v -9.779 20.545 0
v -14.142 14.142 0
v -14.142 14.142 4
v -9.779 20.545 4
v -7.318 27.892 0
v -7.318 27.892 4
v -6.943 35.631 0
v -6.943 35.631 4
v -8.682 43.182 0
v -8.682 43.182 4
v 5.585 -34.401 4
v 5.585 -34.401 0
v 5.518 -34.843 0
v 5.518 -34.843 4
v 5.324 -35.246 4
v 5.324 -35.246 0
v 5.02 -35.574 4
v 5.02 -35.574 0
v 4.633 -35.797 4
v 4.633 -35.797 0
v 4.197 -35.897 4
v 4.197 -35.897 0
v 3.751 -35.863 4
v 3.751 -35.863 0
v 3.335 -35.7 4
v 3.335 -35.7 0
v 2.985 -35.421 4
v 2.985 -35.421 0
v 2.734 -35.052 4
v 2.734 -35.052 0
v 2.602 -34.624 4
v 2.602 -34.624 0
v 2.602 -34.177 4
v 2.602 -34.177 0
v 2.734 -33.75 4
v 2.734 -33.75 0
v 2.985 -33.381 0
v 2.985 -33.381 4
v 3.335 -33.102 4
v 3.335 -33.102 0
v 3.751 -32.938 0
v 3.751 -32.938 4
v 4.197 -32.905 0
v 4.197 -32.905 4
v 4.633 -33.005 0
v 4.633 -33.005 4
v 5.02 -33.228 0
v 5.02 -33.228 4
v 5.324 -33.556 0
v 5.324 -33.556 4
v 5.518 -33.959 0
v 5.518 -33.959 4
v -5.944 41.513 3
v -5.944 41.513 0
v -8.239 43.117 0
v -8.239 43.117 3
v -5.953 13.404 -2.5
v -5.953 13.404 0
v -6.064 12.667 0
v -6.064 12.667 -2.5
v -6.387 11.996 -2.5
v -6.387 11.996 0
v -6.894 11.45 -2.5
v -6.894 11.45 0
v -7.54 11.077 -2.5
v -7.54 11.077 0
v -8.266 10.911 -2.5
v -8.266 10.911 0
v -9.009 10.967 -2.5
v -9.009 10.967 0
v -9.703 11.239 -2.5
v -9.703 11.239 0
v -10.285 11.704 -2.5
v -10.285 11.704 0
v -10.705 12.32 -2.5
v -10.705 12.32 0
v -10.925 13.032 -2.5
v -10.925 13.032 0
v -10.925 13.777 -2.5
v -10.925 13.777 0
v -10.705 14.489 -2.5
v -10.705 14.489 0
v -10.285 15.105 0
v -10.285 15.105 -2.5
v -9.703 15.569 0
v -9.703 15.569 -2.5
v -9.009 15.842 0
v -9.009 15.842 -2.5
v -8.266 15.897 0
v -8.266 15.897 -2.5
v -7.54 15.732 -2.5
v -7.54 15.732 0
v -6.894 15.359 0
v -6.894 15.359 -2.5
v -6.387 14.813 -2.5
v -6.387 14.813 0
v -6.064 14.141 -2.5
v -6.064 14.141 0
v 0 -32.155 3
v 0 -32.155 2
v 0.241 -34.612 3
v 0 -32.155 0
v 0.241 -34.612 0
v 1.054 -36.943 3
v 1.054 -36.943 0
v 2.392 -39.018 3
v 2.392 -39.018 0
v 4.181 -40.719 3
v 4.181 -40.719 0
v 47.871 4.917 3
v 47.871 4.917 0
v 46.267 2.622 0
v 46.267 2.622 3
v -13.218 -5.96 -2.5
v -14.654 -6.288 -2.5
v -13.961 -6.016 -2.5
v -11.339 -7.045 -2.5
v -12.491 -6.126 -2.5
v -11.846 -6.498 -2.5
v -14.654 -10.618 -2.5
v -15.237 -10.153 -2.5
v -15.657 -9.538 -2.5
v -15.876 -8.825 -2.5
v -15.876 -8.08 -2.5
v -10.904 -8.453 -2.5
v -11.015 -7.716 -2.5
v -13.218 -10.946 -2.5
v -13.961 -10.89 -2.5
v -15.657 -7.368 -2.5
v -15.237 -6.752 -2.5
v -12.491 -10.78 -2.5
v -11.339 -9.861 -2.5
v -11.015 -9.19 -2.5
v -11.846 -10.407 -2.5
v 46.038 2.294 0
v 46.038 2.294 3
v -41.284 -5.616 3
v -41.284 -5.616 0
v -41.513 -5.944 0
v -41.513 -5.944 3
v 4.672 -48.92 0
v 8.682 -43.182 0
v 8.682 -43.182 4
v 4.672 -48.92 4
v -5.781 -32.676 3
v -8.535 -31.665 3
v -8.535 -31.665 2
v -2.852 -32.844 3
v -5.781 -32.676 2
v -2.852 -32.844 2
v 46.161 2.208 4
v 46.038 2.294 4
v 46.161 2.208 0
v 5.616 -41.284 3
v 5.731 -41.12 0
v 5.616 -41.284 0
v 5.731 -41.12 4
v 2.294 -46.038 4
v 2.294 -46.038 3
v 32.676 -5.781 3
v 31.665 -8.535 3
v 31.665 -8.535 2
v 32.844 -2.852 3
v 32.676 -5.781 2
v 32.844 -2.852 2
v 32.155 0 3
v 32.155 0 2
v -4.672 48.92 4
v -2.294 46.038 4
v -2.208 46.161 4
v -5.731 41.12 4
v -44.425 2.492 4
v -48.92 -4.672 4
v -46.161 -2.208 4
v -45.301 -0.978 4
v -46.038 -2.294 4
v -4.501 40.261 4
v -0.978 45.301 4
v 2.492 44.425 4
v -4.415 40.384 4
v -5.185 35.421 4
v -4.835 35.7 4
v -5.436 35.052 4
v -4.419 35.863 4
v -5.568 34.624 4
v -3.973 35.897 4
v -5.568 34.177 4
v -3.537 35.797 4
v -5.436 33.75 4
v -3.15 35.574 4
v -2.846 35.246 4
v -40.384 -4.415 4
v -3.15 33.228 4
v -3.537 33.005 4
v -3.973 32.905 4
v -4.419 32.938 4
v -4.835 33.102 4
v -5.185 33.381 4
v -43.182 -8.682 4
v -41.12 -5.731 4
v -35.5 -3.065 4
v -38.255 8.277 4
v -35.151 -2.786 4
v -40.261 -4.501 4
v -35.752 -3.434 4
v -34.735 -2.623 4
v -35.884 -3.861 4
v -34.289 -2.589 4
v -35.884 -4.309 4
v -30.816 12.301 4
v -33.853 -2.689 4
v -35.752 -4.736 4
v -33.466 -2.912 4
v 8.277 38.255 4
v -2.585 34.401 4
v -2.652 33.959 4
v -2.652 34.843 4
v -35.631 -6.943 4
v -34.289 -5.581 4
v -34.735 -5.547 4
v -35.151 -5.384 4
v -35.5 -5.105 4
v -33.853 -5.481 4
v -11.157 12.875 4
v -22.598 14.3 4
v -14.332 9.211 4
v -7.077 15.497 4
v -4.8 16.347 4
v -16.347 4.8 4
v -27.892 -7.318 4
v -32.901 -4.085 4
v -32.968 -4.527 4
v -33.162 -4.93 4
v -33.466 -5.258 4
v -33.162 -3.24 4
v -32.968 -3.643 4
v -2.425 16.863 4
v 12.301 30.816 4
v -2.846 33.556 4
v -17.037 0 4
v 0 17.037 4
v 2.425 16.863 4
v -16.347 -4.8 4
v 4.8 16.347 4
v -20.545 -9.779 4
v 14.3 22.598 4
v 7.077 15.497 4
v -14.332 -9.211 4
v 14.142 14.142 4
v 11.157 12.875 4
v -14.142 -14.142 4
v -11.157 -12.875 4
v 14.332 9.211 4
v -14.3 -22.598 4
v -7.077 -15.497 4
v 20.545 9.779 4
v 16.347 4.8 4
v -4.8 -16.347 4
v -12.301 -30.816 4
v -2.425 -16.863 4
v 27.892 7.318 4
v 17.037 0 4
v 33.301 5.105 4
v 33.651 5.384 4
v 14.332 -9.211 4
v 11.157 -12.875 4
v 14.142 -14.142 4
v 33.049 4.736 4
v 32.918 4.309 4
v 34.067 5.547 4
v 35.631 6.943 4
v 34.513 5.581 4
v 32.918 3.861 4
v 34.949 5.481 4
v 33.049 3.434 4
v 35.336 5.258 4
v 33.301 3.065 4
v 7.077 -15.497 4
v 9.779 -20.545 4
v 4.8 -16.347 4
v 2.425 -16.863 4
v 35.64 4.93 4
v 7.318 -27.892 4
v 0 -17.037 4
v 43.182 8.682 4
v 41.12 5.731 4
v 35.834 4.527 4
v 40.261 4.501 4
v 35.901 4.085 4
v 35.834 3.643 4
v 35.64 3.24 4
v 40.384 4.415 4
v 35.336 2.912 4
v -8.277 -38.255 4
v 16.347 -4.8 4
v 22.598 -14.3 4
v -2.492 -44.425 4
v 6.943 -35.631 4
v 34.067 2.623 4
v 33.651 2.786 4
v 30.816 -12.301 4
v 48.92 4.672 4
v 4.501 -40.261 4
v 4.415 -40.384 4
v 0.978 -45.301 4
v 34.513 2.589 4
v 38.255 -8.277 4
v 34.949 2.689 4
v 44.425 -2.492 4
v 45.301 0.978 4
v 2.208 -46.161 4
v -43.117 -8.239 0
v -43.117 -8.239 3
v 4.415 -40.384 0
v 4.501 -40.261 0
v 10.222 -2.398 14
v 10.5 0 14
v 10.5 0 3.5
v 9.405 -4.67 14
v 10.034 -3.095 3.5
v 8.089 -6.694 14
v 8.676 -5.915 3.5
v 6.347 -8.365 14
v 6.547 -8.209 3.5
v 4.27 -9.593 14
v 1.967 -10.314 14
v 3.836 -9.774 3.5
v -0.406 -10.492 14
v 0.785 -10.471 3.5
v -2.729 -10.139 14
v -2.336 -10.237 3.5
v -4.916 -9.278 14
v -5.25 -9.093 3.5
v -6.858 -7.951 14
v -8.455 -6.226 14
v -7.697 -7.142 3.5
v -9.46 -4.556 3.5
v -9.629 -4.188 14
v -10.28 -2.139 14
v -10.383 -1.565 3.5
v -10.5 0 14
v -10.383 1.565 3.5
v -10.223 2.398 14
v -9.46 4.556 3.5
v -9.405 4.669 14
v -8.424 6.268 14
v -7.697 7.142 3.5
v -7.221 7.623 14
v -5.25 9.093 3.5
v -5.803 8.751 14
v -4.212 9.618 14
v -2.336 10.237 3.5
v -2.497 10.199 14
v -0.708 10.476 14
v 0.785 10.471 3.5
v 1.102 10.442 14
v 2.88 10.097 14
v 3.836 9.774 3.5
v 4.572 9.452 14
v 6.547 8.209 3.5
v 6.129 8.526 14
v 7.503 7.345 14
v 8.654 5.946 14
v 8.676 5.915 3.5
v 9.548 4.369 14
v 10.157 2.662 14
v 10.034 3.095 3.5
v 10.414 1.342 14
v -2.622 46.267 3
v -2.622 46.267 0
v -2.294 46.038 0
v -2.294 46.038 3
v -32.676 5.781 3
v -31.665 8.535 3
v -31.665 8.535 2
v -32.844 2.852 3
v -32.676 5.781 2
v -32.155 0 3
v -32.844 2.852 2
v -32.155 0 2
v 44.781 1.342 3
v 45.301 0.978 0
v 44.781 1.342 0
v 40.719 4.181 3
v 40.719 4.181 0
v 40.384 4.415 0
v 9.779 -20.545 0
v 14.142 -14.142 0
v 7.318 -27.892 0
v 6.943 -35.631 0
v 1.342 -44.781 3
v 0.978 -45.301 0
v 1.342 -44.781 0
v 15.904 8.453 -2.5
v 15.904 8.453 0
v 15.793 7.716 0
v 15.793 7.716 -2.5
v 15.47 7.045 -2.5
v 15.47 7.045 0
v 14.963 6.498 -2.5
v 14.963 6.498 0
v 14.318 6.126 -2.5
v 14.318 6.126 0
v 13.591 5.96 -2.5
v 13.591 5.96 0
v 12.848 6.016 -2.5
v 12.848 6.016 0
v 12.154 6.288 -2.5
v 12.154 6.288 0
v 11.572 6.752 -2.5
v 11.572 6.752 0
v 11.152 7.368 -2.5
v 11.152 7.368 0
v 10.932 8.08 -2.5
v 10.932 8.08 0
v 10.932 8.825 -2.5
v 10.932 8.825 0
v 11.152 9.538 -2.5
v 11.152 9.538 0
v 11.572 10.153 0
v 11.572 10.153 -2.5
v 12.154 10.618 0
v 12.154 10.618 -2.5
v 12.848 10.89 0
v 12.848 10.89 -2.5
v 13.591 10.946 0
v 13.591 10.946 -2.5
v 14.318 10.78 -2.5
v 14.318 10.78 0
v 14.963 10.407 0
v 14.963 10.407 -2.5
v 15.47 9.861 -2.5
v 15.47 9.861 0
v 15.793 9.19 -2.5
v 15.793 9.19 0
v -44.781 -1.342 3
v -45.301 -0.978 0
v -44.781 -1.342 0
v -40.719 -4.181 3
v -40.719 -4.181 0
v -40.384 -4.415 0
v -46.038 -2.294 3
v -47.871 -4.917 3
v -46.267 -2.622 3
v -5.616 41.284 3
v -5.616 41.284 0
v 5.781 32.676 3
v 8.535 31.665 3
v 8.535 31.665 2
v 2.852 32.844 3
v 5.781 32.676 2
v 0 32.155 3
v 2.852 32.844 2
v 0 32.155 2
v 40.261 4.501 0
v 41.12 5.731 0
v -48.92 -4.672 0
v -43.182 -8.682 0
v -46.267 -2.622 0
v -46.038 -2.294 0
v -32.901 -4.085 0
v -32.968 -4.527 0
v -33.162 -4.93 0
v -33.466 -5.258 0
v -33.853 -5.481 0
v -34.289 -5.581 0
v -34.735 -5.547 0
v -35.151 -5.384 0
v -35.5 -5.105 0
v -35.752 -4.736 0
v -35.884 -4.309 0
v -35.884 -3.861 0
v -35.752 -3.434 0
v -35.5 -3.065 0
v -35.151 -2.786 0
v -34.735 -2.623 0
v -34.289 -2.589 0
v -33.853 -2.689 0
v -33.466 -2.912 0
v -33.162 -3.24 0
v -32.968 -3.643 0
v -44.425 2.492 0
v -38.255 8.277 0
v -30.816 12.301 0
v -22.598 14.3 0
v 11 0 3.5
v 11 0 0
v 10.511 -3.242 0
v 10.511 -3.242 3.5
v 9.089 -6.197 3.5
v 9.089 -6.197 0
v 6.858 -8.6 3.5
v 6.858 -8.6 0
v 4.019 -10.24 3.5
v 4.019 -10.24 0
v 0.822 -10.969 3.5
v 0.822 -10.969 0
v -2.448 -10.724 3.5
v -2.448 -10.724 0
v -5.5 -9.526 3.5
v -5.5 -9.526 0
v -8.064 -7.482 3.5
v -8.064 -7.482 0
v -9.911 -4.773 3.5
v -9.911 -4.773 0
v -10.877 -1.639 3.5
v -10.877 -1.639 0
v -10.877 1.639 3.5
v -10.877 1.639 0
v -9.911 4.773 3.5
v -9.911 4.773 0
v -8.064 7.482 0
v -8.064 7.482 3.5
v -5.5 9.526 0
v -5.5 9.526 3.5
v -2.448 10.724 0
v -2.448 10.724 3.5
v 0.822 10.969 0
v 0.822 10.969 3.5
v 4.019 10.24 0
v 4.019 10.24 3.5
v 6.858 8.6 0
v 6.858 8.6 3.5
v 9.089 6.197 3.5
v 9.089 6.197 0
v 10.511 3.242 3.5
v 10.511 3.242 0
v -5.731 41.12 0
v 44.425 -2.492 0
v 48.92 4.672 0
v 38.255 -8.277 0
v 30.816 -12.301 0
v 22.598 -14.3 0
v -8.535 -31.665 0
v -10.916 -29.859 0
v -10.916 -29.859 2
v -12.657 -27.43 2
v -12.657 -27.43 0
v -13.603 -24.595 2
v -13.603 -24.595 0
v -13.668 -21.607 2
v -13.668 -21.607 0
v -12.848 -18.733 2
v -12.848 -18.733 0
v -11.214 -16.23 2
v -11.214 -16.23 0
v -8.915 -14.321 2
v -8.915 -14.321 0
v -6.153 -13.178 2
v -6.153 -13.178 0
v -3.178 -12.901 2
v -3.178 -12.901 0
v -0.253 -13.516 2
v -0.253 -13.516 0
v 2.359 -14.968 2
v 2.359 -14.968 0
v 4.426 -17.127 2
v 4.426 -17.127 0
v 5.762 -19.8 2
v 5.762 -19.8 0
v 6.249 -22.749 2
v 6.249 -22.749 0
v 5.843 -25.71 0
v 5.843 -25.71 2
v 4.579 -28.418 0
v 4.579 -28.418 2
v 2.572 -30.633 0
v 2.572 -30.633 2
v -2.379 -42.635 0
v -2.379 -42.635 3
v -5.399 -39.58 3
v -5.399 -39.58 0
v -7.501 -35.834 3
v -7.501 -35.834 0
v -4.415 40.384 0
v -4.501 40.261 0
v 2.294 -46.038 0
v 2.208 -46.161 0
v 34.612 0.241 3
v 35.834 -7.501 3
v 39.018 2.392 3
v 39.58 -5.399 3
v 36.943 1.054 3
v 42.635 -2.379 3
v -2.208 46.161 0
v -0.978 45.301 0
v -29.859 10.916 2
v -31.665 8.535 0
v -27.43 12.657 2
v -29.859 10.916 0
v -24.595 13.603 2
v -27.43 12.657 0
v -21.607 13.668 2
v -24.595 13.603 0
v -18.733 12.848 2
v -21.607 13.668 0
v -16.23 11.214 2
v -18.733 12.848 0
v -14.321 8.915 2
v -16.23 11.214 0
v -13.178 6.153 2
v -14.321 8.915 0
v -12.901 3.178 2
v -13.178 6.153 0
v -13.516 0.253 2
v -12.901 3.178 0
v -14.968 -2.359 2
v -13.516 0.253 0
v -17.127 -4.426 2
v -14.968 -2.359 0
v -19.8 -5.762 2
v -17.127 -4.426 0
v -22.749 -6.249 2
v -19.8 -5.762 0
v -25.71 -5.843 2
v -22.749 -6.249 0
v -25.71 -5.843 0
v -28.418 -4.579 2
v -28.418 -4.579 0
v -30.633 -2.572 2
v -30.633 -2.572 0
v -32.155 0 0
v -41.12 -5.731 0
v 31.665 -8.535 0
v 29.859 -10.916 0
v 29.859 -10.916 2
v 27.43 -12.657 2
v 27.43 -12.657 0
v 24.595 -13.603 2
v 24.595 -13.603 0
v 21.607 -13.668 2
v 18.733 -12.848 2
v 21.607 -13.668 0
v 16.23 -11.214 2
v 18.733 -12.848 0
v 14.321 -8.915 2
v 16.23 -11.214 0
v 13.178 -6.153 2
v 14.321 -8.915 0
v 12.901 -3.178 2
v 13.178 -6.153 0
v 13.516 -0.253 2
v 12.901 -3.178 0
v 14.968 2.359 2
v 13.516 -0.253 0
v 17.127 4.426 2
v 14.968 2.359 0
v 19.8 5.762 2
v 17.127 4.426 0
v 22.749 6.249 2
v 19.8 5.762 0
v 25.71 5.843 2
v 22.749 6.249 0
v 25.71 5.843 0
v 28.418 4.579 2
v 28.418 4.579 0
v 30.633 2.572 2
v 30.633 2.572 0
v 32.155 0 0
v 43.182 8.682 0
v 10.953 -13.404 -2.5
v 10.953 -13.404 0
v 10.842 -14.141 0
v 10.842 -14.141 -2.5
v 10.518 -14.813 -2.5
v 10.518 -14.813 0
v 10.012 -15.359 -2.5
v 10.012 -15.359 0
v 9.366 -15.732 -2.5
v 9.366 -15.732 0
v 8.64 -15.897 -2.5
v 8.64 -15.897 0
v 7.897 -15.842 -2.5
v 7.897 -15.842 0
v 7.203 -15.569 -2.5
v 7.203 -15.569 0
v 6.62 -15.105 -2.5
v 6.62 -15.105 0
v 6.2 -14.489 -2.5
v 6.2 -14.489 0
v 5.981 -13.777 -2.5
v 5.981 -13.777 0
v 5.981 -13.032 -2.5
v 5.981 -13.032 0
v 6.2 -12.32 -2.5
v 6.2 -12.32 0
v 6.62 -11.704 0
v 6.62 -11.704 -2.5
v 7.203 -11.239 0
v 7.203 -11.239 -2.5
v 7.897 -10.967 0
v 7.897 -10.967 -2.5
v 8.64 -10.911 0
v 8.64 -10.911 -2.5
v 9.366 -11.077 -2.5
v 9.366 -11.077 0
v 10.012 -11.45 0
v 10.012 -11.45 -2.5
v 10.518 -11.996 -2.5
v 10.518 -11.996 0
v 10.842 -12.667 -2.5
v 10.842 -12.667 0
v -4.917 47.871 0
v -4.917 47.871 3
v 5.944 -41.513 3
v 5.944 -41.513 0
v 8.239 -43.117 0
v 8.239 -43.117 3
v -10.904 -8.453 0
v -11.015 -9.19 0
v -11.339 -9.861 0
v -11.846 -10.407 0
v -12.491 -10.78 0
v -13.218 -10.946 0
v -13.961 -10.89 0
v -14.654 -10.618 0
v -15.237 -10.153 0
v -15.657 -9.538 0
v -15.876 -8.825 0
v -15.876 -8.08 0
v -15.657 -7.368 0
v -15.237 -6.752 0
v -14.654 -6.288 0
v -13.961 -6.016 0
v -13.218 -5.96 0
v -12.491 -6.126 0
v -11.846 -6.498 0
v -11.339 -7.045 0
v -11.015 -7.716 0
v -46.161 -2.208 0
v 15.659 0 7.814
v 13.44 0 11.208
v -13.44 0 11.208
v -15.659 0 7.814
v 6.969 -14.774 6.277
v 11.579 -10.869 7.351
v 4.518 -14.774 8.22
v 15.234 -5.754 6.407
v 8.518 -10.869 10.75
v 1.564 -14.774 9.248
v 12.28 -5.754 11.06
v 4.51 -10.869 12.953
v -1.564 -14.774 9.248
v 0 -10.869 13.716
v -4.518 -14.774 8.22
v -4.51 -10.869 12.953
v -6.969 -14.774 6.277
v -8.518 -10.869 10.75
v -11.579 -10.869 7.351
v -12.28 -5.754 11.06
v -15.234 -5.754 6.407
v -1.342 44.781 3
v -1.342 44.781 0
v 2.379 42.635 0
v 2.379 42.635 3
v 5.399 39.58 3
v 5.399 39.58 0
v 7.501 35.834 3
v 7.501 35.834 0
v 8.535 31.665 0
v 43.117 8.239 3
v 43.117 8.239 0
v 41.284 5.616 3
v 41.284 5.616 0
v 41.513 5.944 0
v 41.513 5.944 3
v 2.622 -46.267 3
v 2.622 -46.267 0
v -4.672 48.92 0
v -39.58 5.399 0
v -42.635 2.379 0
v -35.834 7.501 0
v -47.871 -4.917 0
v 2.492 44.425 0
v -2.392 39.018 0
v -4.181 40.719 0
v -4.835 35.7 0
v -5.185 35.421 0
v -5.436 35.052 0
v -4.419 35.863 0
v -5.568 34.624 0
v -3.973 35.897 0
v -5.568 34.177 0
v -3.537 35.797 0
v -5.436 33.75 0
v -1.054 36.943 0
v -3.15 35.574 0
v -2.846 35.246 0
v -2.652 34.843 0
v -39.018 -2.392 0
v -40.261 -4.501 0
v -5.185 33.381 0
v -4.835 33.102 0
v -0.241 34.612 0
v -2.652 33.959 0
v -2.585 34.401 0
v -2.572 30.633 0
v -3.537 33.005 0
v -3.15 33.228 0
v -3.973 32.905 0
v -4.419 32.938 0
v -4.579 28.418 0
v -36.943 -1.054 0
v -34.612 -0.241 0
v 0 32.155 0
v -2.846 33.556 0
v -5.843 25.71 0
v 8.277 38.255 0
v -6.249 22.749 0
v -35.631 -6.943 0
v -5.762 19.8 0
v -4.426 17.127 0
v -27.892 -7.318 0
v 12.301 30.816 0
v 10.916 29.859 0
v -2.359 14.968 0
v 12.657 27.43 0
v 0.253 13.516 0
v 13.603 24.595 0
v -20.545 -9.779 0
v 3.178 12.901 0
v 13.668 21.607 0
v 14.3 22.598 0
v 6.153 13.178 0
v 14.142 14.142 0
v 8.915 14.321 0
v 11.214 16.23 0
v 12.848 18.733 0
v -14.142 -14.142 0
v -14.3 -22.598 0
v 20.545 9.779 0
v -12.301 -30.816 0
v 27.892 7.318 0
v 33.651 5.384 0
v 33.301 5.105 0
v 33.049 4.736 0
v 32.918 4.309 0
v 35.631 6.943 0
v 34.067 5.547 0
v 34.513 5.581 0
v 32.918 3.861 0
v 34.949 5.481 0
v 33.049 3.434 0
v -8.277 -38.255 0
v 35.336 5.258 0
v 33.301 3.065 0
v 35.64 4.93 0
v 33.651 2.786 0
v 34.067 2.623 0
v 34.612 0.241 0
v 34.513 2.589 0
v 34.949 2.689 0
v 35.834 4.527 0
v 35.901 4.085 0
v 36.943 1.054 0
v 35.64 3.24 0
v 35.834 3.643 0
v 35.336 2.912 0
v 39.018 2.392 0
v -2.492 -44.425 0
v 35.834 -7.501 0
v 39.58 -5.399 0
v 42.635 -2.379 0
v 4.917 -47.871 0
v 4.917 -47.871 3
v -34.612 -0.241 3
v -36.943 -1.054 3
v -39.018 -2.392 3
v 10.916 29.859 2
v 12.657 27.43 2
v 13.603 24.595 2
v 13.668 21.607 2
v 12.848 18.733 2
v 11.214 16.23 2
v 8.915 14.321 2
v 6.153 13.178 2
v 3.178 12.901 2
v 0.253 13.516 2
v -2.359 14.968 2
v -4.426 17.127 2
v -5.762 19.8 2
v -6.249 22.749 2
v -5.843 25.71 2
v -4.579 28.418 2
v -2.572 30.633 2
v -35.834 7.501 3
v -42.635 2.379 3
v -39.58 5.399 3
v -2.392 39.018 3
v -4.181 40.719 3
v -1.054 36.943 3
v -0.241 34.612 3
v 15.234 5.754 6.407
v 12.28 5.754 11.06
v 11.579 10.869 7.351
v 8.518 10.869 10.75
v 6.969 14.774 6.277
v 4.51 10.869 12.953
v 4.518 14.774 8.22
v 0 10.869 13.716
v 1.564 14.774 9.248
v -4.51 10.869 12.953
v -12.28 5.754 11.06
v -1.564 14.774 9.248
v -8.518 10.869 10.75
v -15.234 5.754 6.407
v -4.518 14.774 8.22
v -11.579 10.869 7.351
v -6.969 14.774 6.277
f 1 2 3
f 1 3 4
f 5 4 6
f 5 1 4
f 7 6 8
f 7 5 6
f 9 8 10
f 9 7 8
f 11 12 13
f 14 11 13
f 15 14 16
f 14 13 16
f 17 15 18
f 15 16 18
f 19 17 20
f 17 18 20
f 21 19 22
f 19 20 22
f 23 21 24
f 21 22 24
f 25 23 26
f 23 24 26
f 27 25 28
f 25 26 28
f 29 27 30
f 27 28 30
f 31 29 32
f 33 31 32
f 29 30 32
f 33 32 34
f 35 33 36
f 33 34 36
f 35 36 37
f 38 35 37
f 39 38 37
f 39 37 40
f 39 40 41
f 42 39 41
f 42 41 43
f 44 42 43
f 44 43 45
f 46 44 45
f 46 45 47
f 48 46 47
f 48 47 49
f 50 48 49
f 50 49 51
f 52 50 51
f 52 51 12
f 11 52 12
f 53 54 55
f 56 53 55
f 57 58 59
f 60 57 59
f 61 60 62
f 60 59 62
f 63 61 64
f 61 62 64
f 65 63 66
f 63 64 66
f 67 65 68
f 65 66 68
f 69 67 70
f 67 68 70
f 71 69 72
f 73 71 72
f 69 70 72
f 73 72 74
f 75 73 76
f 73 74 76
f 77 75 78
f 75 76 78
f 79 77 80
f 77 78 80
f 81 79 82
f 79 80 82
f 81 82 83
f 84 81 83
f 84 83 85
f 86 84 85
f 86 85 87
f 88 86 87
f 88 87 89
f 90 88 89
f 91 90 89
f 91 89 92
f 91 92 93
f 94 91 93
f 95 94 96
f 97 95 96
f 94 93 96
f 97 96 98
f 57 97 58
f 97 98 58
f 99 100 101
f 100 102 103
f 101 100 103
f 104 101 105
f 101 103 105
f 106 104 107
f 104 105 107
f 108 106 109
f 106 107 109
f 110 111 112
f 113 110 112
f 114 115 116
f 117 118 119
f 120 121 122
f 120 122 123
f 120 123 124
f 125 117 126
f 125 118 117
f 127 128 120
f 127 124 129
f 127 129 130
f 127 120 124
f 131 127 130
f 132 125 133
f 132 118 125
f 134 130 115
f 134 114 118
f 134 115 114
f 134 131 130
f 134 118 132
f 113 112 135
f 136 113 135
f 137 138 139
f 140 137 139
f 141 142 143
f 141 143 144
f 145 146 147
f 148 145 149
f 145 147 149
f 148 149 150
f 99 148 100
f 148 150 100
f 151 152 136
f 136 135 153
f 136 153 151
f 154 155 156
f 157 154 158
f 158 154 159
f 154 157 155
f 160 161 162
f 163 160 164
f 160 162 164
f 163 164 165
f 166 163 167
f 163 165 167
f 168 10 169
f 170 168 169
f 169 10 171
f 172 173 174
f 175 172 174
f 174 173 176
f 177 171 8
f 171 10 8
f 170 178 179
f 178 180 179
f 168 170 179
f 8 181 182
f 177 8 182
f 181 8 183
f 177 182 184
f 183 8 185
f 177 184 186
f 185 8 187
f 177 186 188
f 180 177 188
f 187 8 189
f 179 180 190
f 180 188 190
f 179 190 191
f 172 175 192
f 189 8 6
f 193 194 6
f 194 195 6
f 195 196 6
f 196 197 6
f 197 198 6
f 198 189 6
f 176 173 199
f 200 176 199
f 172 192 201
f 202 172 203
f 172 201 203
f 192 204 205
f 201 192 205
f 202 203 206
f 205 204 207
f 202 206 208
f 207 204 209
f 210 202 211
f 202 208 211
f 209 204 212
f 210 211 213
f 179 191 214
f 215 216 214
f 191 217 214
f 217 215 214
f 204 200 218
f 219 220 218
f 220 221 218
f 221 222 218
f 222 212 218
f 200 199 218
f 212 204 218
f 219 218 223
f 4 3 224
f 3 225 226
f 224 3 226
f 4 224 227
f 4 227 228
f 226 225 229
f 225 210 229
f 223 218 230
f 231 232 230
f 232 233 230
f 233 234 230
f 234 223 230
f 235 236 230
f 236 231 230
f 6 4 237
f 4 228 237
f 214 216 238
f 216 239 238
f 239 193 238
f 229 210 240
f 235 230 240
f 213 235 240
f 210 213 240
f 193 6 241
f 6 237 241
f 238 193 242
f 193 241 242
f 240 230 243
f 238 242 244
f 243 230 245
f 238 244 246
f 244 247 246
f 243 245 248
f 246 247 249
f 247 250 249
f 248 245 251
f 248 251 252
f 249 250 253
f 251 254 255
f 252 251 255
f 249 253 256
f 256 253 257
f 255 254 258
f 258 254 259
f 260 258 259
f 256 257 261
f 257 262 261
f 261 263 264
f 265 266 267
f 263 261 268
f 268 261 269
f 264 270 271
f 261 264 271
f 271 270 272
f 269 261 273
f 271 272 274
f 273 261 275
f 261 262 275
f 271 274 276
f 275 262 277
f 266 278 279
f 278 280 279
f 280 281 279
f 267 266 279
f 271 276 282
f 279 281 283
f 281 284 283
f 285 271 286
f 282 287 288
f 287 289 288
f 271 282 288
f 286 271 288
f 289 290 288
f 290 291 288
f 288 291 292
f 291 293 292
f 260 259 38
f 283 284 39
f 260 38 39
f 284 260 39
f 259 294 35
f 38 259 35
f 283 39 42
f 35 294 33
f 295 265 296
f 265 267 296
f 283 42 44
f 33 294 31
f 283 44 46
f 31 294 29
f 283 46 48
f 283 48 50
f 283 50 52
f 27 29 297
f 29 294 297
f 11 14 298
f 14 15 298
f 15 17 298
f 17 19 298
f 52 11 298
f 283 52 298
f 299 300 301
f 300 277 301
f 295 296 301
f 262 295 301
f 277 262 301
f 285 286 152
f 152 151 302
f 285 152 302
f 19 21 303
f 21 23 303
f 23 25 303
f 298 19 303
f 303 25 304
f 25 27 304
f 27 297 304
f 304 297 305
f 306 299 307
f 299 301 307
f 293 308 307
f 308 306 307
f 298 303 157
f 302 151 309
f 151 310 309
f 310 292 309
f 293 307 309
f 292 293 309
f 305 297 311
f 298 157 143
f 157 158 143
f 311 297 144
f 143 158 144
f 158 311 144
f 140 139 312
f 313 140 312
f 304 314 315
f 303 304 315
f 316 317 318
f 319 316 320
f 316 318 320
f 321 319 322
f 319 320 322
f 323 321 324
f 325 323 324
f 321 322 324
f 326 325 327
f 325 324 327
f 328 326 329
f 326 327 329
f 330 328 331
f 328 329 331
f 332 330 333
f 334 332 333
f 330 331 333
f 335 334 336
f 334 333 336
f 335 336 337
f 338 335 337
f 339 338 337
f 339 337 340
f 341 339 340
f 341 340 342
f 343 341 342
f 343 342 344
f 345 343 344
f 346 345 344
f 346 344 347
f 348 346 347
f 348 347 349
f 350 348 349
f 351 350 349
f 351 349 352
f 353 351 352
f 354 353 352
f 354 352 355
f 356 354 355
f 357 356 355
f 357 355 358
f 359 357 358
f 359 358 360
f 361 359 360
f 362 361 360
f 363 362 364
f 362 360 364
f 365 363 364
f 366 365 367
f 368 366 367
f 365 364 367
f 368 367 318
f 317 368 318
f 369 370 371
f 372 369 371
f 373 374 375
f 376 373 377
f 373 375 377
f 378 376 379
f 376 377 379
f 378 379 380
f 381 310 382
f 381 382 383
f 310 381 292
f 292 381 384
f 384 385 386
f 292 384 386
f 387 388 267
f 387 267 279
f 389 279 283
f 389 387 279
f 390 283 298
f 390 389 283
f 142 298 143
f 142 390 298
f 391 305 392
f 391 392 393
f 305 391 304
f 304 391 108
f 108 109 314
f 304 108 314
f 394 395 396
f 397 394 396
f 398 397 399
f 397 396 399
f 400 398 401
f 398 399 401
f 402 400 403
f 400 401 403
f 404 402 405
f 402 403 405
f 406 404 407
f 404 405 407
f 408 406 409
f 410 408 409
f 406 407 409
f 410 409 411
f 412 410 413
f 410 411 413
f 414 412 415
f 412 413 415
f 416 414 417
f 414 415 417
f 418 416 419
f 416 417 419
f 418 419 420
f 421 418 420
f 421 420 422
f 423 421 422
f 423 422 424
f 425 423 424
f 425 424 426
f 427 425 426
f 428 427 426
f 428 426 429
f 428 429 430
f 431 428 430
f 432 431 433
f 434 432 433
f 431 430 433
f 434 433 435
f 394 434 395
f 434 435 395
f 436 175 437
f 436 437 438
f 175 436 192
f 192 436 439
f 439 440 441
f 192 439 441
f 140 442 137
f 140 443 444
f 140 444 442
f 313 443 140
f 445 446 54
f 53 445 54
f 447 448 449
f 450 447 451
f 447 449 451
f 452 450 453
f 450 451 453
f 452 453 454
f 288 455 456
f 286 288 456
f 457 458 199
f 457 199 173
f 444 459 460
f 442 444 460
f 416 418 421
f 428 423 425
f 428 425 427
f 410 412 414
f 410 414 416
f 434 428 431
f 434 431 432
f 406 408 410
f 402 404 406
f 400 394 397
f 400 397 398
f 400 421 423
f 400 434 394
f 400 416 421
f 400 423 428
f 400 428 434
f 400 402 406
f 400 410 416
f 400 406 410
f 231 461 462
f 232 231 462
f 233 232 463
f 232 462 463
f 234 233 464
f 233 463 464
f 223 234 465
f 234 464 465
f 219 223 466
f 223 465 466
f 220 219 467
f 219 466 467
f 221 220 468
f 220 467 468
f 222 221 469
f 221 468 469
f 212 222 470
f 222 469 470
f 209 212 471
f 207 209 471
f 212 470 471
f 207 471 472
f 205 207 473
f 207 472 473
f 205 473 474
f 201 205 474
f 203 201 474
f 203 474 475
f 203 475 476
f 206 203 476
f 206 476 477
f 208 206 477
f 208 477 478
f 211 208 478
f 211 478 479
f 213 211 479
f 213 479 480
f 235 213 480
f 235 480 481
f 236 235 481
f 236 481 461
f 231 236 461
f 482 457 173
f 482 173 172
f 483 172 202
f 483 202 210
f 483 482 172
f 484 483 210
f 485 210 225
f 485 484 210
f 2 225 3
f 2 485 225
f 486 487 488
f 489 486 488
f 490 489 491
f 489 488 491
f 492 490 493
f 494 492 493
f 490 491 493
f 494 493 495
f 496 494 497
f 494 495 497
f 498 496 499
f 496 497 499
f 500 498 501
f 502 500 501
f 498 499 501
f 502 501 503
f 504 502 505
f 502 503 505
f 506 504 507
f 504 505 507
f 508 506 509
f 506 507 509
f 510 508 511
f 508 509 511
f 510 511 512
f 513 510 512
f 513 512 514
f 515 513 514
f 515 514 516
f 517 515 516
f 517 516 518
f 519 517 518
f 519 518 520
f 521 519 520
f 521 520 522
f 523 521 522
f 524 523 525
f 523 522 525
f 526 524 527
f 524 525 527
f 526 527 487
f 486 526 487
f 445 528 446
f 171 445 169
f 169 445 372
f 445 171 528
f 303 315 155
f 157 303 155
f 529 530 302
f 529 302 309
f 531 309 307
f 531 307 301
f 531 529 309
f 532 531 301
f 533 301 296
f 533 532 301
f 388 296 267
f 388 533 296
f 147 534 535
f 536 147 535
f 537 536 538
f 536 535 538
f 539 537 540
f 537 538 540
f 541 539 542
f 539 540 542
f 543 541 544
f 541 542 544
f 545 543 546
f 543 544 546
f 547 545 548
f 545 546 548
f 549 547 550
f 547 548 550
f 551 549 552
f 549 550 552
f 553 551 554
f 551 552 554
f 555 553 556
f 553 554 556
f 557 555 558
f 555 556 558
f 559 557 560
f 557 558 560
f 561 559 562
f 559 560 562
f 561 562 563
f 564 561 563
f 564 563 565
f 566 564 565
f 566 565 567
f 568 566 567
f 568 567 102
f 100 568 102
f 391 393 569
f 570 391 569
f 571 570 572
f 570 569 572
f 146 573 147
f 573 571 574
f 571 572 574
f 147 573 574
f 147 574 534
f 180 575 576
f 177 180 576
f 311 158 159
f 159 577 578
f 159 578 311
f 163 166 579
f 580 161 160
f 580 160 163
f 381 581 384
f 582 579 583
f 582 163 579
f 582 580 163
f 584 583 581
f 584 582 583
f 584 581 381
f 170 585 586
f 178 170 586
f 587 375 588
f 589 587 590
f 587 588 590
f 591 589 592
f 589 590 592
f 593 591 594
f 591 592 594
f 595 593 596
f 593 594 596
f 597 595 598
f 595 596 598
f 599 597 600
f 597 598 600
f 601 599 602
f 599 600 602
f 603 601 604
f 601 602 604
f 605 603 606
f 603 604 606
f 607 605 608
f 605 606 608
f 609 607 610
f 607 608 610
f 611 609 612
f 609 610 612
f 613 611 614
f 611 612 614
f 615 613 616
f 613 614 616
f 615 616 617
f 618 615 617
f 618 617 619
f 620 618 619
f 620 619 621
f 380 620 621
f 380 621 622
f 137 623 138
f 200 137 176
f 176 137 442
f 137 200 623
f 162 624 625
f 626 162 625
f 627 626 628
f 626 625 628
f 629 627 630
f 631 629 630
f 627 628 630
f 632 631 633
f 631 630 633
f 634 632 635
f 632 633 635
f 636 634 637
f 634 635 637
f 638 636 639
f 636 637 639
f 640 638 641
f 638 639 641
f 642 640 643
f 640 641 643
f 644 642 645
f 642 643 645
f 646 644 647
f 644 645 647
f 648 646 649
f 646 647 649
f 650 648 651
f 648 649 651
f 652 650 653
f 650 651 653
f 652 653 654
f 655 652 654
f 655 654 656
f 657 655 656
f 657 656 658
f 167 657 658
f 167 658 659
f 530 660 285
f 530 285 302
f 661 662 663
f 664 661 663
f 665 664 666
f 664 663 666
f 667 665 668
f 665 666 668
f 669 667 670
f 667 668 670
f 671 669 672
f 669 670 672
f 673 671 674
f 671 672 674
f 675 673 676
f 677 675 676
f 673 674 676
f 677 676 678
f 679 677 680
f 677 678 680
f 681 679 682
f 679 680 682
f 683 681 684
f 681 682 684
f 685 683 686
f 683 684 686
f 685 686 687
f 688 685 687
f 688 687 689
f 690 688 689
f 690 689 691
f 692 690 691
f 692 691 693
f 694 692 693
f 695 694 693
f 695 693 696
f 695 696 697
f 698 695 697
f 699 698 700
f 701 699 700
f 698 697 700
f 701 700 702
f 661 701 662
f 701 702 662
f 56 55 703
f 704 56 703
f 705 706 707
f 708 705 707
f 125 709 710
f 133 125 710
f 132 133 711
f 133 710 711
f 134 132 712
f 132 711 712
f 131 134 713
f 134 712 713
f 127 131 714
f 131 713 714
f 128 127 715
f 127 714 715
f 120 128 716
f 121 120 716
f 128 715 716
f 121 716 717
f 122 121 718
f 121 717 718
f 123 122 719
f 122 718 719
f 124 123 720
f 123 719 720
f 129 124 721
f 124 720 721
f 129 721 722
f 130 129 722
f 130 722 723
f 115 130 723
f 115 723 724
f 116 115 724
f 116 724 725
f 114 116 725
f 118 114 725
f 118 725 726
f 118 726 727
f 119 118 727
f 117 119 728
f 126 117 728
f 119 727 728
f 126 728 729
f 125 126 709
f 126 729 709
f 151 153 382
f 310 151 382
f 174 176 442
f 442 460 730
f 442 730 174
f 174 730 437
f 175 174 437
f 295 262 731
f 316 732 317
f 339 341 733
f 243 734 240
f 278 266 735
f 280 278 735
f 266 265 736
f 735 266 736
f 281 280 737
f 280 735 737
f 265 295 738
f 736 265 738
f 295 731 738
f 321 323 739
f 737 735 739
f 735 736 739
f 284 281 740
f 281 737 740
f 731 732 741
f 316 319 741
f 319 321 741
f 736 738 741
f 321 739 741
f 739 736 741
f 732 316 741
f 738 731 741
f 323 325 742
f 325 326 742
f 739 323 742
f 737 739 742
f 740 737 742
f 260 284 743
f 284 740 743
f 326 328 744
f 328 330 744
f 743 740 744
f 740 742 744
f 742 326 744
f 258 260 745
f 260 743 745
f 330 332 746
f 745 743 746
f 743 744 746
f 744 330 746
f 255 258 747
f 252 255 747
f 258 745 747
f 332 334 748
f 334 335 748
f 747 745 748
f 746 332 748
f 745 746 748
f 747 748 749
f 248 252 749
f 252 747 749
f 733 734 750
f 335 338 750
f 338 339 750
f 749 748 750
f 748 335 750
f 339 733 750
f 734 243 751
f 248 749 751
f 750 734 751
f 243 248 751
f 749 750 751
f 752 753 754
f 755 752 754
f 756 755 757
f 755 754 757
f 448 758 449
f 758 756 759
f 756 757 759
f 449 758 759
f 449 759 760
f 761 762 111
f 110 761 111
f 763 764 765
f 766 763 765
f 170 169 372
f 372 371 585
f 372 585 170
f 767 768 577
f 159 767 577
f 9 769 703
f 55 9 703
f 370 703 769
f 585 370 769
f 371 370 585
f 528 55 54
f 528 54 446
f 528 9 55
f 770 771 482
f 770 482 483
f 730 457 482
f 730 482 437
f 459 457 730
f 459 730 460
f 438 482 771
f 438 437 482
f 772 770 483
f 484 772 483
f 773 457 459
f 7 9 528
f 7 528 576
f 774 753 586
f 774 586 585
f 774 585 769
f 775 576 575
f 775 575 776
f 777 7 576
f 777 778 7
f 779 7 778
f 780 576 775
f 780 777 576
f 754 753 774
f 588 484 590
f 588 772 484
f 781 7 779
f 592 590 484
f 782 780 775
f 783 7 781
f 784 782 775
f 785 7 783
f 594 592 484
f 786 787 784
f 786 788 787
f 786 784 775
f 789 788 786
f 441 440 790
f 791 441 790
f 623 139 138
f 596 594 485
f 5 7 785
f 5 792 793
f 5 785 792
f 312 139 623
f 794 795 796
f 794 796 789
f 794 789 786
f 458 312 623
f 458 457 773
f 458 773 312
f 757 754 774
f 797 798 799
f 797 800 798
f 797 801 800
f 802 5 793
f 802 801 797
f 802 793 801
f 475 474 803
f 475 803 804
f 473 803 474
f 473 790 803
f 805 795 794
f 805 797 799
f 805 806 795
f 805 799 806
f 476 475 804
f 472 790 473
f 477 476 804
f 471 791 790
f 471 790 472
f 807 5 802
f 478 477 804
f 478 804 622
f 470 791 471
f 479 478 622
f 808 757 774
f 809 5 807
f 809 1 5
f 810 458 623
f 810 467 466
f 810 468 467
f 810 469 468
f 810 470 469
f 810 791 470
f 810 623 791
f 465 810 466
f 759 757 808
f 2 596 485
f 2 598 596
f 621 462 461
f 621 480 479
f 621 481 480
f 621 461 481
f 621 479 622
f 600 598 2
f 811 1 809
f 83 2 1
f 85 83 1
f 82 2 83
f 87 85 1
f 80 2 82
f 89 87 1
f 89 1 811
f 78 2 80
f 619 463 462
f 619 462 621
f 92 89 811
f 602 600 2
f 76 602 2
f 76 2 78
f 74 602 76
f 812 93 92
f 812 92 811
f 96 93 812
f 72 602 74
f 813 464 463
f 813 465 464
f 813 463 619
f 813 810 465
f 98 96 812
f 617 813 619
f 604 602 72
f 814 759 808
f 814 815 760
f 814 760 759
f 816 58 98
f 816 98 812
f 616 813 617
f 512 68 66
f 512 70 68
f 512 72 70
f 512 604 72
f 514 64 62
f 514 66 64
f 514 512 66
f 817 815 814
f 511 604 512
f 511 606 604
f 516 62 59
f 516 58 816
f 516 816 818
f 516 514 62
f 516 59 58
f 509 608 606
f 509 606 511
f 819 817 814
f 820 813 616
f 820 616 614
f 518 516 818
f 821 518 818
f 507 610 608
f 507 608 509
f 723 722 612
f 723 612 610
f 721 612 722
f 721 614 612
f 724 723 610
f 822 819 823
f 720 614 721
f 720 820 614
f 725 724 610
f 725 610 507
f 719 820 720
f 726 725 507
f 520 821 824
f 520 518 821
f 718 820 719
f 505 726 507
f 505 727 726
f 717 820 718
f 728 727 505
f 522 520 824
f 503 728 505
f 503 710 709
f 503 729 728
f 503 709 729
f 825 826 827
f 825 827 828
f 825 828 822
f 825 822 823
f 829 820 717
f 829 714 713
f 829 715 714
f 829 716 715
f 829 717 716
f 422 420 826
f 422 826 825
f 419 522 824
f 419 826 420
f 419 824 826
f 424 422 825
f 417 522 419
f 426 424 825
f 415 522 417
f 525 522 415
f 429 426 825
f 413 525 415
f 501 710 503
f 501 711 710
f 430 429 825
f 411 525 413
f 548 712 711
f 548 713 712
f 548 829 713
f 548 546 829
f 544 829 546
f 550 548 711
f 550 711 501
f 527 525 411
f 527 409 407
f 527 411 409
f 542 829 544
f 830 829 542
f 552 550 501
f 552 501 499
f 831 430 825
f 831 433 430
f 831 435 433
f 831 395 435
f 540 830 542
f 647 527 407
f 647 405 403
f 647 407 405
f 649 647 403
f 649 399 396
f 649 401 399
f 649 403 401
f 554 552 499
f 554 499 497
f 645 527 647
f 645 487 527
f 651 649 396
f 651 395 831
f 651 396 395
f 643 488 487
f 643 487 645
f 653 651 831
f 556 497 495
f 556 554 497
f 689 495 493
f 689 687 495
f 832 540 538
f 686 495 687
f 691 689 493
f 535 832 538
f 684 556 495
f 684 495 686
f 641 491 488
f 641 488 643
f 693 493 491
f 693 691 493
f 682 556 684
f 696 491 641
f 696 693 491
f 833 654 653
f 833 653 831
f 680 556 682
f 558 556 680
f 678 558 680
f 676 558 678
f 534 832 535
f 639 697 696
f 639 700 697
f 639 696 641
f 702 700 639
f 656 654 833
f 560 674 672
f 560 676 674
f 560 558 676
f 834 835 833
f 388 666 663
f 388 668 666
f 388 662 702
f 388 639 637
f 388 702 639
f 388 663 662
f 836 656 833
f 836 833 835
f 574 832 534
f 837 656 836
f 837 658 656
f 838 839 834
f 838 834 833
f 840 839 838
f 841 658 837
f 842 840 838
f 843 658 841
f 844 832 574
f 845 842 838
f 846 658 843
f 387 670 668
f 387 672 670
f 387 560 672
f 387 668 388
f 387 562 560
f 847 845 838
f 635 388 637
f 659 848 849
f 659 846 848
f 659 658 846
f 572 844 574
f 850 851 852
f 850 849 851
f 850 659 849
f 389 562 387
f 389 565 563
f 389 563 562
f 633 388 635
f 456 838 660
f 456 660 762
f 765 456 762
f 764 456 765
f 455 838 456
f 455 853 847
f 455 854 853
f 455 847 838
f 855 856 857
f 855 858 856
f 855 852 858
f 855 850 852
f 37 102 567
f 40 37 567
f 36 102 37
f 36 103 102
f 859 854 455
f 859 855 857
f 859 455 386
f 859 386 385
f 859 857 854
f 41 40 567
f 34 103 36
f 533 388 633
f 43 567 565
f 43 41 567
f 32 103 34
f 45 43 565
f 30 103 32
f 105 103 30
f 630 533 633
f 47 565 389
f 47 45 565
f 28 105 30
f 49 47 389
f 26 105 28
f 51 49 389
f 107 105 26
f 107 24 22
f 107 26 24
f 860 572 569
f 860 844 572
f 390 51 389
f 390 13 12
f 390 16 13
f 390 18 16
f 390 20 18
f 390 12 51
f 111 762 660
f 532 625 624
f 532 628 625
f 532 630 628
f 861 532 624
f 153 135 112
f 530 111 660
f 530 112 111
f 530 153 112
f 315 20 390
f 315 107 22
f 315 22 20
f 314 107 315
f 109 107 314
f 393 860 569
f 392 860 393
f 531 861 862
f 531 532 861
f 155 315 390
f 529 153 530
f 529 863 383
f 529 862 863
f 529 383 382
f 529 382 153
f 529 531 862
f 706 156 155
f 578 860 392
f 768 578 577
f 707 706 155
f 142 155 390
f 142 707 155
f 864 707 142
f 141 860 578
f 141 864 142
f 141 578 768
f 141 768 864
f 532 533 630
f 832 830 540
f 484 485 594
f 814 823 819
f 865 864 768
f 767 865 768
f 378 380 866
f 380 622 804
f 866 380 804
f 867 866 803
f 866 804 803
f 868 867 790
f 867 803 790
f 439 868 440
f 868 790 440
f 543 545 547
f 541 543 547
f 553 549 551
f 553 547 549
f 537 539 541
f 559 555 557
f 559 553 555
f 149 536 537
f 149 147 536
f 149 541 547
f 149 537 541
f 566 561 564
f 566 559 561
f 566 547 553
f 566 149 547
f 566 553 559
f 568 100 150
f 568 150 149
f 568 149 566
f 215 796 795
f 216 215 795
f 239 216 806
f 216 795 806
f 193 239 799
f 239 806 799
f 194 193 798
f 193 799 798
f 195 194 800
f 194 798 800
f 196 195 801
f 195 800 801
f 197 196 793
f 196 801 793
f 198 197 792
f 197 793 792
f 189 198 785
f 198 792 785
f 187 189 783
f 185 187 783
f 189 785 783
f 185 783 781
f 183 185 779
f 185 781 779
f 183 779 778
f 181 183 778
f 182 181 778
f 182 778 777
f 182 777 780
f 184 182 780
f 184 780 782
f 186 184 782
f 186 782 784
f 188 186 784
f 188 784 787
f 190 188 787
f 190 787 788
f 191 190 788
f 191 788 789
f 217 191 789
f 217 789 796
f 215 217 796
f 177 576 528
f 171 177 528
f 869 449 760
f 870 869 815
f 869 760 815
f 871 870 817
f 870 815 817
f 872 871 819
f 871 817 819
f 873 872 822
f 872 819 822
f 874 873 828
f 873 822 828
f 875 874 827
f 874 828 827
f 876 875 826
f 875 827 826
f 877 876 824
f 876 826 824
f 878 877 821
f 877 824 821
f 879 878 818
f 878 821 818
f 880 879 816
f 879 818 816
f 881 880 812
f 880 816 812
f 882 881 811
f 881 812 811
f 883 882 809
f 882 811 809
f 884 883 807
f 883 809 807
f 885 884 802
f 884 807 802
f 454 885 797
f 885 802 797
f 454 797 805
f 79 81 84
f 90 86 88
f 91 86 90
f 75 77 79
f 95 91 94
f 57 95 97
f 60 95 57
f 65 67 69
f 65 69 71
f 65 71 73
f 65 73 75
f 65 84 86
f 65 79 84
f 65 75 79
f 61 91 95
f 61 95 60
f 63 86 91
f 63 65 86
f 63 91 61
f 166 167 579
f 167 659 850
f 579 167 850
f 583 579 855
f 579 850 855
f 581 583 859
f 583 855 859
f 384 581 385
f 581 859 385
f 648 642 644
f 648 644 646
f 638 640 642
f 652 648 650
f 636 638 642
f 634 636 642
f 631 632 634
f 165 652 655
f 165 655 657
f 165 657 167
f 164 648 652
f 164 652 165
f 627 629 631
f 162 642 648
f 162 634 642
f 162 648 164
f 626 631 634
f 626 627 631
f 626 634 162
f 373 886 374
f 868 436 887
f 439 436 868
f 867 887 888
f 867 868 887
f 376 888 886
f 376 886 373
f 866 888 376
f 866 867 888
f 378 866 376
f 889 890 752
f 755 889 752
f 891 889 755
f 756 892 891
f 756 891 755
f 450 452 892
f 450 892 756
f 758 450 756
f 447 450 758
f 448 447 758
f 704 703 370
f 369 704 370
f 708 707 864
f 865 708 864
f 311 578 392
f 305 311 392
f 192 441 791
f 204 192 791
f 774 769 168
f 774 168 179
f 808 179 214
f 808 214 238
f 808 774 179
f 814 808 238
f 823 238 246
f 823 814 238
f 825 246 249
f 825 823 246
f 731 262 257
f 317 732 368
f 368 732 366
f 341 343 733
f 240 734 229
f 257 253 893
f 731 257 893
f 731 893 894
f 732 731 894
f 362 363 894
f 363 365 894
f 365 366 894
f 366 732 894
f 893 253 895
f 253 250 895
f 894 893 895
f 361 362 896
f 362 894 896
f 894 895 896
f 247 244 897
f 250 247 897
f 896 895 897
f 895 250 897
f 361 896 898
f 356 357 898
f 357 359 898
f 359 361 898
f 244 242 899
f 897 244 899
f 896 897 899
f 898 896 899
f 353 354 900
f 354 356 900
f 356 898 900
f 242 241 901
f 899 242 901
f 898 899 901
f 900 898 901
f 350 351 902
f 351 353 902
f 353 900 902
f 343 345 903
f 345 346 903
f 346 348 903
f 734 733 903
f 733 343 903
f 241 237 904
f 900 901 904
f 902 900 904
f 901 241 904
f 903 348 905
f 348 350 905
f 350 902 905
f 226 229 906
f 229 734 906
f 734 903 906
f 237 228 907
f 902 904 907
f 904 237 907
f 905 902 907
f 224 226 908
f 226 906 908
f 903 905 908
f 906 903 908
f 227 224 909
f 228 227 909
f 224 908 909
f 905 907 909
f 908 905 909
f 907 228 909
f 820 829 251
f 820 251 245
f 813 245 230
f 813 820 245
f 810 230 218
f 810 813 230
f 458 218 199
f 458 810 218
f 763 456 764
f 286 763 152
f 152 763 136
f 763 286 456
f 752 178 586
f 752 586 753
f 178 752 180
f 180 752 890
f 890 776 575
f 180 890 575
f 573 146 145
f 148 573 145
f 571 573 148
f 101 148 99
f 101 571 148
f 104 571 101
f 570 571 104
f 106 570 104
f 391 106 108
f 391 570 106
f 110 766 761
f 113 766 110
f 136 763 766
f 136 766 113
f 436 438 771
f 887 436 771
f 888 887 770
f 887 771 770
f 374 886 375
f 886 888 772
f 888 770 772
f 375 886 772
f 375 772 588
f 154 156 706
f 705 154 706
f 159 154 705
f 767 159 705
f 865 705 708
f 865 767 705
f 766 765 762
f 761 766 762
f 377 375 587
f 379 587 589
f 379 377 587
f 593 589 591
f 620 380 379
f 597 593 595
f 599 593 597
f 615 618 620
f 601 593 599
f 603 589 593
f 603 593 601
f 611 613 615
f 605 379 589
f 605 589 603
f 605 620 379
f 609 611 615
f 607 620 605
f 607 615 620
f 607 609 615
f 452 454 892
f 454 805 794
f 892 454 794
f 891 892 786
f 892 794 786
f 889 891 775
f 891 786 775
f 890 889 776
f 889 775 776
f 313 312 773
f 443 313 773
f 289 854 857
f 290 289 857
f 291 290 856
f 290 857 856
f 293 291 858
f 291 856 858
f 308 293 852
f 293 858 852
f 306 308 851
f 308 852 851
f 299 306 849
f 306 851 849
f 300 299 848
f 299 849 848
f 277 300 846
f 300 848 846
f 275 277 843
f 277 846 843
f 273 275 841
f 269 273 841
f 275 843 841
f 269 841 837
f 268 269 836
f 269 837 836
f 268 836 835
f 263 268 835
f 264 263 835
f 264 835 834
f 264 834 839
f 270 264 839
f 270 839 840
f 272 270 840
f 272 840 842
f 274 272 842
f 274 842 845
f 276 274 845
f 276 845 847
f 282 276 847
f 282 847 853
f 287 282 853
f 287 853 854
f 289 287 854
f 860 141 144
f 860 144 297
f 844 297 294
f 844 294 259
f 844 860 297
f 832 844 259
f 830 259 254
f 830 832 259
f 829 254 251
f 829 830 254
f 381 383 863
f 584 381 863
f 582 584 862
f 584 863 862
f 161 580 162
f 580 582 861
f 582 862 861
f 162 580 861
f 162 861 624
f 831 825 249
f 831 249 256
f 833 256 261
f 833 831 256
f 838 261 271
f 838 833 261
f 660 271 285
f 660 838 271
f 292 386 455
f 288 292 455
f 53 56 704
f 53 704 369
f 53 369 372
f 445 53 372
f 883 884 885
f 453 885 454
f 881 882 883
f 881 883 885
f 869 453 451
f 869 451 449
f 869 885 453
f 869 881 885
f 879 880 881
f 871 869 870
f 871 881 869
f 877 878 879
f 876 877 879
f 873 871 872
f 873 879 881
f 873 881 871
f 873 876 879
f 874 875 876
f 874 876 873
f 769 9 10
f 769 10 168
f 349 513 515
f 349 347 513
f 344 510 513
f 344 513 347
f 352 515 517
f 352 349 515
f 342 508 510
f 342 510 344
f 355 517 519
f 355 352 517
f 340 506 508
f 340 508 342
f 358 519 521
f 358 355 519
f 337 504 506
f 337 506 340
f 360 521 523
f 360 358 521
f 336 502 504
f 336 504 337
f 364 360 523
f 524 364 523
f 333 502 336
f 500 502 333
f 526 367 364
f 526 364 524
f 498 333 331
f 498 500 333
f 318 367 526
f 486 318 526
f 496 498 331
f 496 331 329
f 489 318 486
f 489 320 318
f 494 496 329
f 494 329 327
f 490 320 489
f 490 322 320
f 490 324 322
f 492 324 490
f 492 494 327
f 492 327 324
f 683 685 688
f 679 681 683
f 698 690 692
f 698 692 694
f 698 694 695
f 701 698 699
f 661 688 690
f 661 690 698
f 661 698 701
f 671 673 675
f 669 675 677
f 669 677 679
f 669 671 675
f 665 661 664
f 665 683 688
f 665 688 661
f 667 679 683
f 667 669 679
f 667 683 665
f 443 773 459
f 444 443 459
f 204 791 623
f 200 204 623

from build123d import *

# Parameters (mm, degrees)
F1_ANGLE  = 180
F2_R      = 11
F3_DEPTH  = 3.5
F4_R      = 10.5
F5_DEPTH  = 17
F7_DEPTH  = 4
F8_R      = 18.641205443
F8_R_2    = 11
F9_DEPTH  = 4
F10_R     = 10
F11_DEPTH = 2
F13_DEPTH = 3
F15_DEPTH = 25
F17_DEPTH = 3
F18_R     = 2.5
F19_DEPTH = 2.5
F20_R     = 1.5
F21_DEPTH = 25


with BuildPart() as f1:
    # F0 (on Top) → F1 (revolve)
    with BuildSketch(Plane.XY):
        with BuildLine():
            ThreePointArc((0, -17.5), (12.3743686708, -12.3743686708), (17.5, 0))
            ThreePointArc((17.5, 0), (12.3743686708, 12.3743686708), (0, 17.5))
            Line((0, 17.5), (0, -17.5))
        make_face()
    revolve(axis=Axis((0, 0, 0), (0, -1, 0)), revolution_arc=F1_ANGLE)

    # F2 (on face) → F3 (cut)
    with BuildSketch(Plane(origin=(0, 0, 0), x_dir=(1, 0, 0), z_dir=(0, 0, -1))):
        Circle(F2_R)
    extrude(amount=-F3_DEPTH, mode=Mode.SUBTRACT)

    # F4 (on face) → F5 (cut)
    with BuildSketch(Plane(origin=(0, 0, 3.5), x_dir=(1, 0, 0), z_dir=(0, 0, -1))):
        Circle(F4_R)
    extrude(amount=-F5_DEPTH, mode=Mode.SUBTRACT)



with BuildPart() as f7:
    # F6 (on face) → F7 (new body)
    with BuildSketch(Plane(origin=(0, 0, 0), x_dir=(1, 0, 0), z_dir=(0, 0, -1))):
        with BuildLine():
            ThreePointArc((-12.3743686708, -12.3743686708), (-17.5, 0), (-12.3743686708, 12.3743686708))
            Line((-12.3743686708, 12.3743686708), (-14.1421356237, 14.1421356237))
            ThreePointArc((-14.1421356237, 14.1421356237), (-27.8923182516, 7.317919876), (-43.1821195756, 8.6815247843))
            Line((-43.1821195756, 8.6815247843), (-48.919726111, 4.6715533074))
            ThreePointArc((-48.919726111, 4.6715533074), (-34.6649635656, -10.5286316429), (-14.1421356237, -14.1421356237))
            Line((-14.1421356237, -14.1421356237), (-12.3743686708, -12.3743686708))
        make_face()
        with BuildLine():
            Line((-14.1421356237, 14.1421356237), (-12.3743686708, 12.3743686708))
            ThreePointArc((-12.3743686708, 12.3743686708), (0, 17.5), (12.3743686708, 12.3743686708))
            Line((12.3743686708, 12.3743686708), (14.1421356237, 14.1421356237))
            ThreePointArc((14.1421356237, 14.1421356237), (7.317919876, 27.8923182516), (8.6815247843, 43.1821195756))
            Line((8.6815247843, 43.1821195756), (4.6715533074, 48.919726111))
            ThreePointArc((4.6715533074, 48.919726111), (-10.5286316429, 34.6649635656), (-14.1421356237, 14.1421356237))
        make_face()
        with BuildLine():
            Line((14.1421356237, 14.1421356237), (12.3743686708, 12.3743686708))
            ThreePointArc((12.3743686708, 12.3743686708), (17.5, 0), (12.3743686708, -12.3743686708))
            Line((12.3743686708, -12.3743686708), (14.1421356237, -14.1421356237))
            ThreePointArc((14.1421356237, -14.1421356237), (27.8923182516, -7.317919876), (43.1821195756, -8.6815247843))
            Line((43.1821195756, -8.6815247843), (48.919726111, -4.6715533074))
            ThreePointArc((48.919726111, -4.6715533074), (34.6649635656, 10.5286316429), (14.1421356237, 14.1421356237))
        make_face()
        with BuildLine():
            ThreePointArc((12.3743686708, -12.3743686708), (0, -17.5), (-12.3743686708, -12.3743686708))
            Line((-12.3743686708, -12.3743686708), (-14.1421356237, -14.1421356237))
            ThreePointArc((-14.1421356237, -14.1421356237), (-7.317919876, -27.8923182516), (-8.6815247843, -43.1821195756))
            Line((-8.6815247843, -43.1821195756), (-4.6715533074, -48.919726111))
            ThreePointArc((-4.6715533074, -48.919726111), (10.5286316429, -34.6649635656), (14.1421356237, -14.1421356237))
            Line((14.1421356237, -14.1421356237), (12.3743686708, -12.3743686708))
        make_face()
    extrude(amount=-F7_DEPTH)


with BuildPart() as f1_1:
    add(f1.part)

    add(f7.part)  # F9 merges F7
    # F8 (on face) → F9 (join, through all)
    with BuildSketch(Plane(origin=(0, 0, 0), x_dir=(1, 0, 0), z_dir=(0, 0, -1))):
        Circle(F8_R)
        Circle(F8_R_2, mode=Mode.SUBTRACT)
    extrude(amount=-F9_DEPTH)

    # F10 (on face) → F11 (cut)
    with BuildSketch(Plane(origin=(0, 0, 0), x_dir=(1, 0, 0), z_dir=(0, 0, -1))):
        with Locations((-3.7499996834, 22.8846166283)):
            Circle(F10_R)
        with Locations((-22.8846166283, -3.7499996834)):
            Circle(F10_R)
        with Locations((3.7499996834, -22.8846166283)):
            Circle(F10_R)
        with Locations((22.8846166283, 3.7499996834)):
            Circle(F10_R)
    extrude(amount=-F11_DEPTH, mode=Mode.SUBTRACT)

    # F12 (on face) → F13 (cut)
    with BuildSketch(Plane(origin=(0, 0, 0), x_dir=(1, 0, 0), z_dir=(0, 0, -1))):
        Polygon((5.9440483259, 41.5129213729), (8.2390909401, 43.1169099636), (4.9165431449, 47.8709268072), (2.6215005308, 46.2669382165), (2.2936373002, 46.0377969892), (5.6161850953, 41.2837801456), align=None)
        Polygon((-46.0377969892, 2.2936373002), (-41.2837801456, 5.6161850953), (-41.5129213729, 5.9440483259), (-43.1169099636, 8.2390909401), (-47.8709268072, 4.9165431449), (-46.2669382165, 2.6215005308), align=None)
        Polygon((-2.2936373002, -46.0377969892), (-5.6161850953, -41.2837801456), (-5.9440483259, -41.5129213729), (-8.2390909401, -43.1169099636), (-4.9165431449, -47.8709268072), (-2.6215005308, -46.2669382165), align=None)
        Polygon((46.0377969892, -2.2936373002), (41.2837801456, -5.6161850953), (41.5129213729, -5.9440483259), (43.1169099636, -8.2390909401), (47.8709268072, -4.9165431449), (46.2669382165, -2.6215005308), align=None)
    extrude(amount=-F13_DEPTH, mode=Mode.SUBTRACT)

    # F14 (on face) → F15 (cut)
    with BuildSketch(Plane(origin=(0, 0, 0), x_dir=(1, 0, 0), z_dir=(0, 0, -1))):
        Polygon((5.7307557089, 41.1198485303), (2.2936373002, 46.0377969892), (2.20770934, 46.1607457007), (0.9782222253, 45.3014660985), (4.415340634, 40.3835176396), (4.5012685942, 40.2605689282), align=None)
        Polygon((-46.1607457007, 2.20770934), (-45.3014660985, 0.9782222253), (-40.3835176396, 4.415340634), (-40.2605689282, 4.5012685942), (-41.1198485303, 5.7307557089), (-46.0377969892, 2.2936373002), align=None)
        Polygon((-2.20770934, -46.1607457007), (-0.9782222253, -45.3014660985), (-4.415340634, -40.3835176396), (-4.5012685942, -40.2605689282), (-5.7307557089, -41.1198485303), (-2.2936373002, -46.0377969892), align=None)
        Polygon((46.1607457007, -2.20770934), (45.3014660985, -0.9782222253), (40.3835176396, -4.415340634), (40.2605689282, -4.5012685942), (41.1198485303, -5.7307557089), (46.0377969892, -2.2936373002), align=None)
    extrude(amount=-F15_DEPTH, mode=Mode.SUBTRACT)

    # F16 (on face) → F17 (cut)
    with BuildSketch(Plane(origin=(0, 0, 0), x_dir=(1, 0, 0), z_dir=(0, 0, -1))):
        with BuildLine():
            Line((4.1809628018, 40.7188735865), (1.342054472, 44.7808822767))
            ThreePointArc((1.342054472, 44.7808822767), (-5.3985401919, 39.5803016206), (-8.5350042844, 31.6654896468))
            ThreePointArc((-8.5350042844, 31.6654896468), (-4.3224338027, 32.8682191434), (0, 32.1548648652))
            ThreePointArc((0, 32.1548648652), (1.0537931887, 36.9429820748), (4.1809628018, 40.7188735865))
        make_face()
        with BuildLine():
            Line((-40.7188735865, 4.1809628018), (-44.7808822767, 1.342054472))
            ThreePointArc((-44.7808822767, 1.342054472), (-39.5803016206, -5.3985401919), (-31.6654896468, -8.5350042844))
            ThreePointArc((-31.6654896468, -8.5350042844), (-32.8682191434, -4.3224338027), (-32.1548648653, 0))
            ThreePointArc((-32.1548648653, 0), (-36.9429820748, 1.0537931887), (-40.7188735865, 4.1809628018))
        make_face()
        with BuildLine():
            Line((-4.1809628018, -40.7188735865), (-1.342054472, -44.7808822767))
            ThreePointArc((-1.342054472, -44.7808822767), (5.3985401919, -39.5803016206), (8.5350042844, -31.6654896468))
            ThreePointArc((8.5350042844, -31.6654896468), (4.3224338027, -32.8682191434), (0, -32.1548648653))
            ThreePointArc((0, -32.1548648653), (-1.0537931887, -36.9429820748), (-4.1809628018, -40.7188735865))
        make_face()
        with BuildLine():
            Line((40.7188735865, -4.1809628018), (44.7808822767, -1.342054472))
            ThreePointArc((44.7808822767, -1.342054472), (39.5803016206, 5.3985401919), (31.6654896468, 8.5350042844))
            ThreePointArc((31.6654896468, 8.5350042844), (32.8682191434, 4.3224338027), (32.1548648652, 0))
            ThreePointArc((32.1548648652, 0), (36.9429820748, -1.0537931887), (40.7188735865, -4.1809628018))
        make_face()
    extrude(amount=-F17_DEPTH, mode=Mode.SUBTRACT)

    # F18 (on face) → F19 (join)
    with BuildSketch(Plane(origin=(0, 0, 0), x_dir=(1, 0, 0), z_dir=(0, 0, -1))):
        with Locations((8.4528671578, 13.4043414146)):
            Circle(F18_R)
        with Locations((-13.4043414146, 8.4528671578)):
            Circle(F18_R)
        with Locations((-8.4528671578, -13.4043414146)):
            Circle(F18_R)
        with Locations((13.4043414146, -8.4528671578)):
            Circle(F18_R)
    extrude(amount=F19_DEPTH)

    # F20 (on face) → F21 (cut)
    with BuildSketch(Plane(origin=(0, 0, 0), x_dir=(1, 0, 0), z_dir=(0, 0, -1))):
        with Locations((4.0849614888, 34.4008803368)):
            Circle(F20_R)
        with Locations((-34.4008803368, 4.0849614888)):
            Circle(F20_R)
        with Locations((-4.0849614888, -34.4008803368)):
            Circle(F20_R)
        with Locations((34.4008803368, -4.0849614888)):
            Circle(F20_R)
    extrude(amount=-F21_DEPTH, mode=Mode.SUBTRACT)


solid = f1_1.part
